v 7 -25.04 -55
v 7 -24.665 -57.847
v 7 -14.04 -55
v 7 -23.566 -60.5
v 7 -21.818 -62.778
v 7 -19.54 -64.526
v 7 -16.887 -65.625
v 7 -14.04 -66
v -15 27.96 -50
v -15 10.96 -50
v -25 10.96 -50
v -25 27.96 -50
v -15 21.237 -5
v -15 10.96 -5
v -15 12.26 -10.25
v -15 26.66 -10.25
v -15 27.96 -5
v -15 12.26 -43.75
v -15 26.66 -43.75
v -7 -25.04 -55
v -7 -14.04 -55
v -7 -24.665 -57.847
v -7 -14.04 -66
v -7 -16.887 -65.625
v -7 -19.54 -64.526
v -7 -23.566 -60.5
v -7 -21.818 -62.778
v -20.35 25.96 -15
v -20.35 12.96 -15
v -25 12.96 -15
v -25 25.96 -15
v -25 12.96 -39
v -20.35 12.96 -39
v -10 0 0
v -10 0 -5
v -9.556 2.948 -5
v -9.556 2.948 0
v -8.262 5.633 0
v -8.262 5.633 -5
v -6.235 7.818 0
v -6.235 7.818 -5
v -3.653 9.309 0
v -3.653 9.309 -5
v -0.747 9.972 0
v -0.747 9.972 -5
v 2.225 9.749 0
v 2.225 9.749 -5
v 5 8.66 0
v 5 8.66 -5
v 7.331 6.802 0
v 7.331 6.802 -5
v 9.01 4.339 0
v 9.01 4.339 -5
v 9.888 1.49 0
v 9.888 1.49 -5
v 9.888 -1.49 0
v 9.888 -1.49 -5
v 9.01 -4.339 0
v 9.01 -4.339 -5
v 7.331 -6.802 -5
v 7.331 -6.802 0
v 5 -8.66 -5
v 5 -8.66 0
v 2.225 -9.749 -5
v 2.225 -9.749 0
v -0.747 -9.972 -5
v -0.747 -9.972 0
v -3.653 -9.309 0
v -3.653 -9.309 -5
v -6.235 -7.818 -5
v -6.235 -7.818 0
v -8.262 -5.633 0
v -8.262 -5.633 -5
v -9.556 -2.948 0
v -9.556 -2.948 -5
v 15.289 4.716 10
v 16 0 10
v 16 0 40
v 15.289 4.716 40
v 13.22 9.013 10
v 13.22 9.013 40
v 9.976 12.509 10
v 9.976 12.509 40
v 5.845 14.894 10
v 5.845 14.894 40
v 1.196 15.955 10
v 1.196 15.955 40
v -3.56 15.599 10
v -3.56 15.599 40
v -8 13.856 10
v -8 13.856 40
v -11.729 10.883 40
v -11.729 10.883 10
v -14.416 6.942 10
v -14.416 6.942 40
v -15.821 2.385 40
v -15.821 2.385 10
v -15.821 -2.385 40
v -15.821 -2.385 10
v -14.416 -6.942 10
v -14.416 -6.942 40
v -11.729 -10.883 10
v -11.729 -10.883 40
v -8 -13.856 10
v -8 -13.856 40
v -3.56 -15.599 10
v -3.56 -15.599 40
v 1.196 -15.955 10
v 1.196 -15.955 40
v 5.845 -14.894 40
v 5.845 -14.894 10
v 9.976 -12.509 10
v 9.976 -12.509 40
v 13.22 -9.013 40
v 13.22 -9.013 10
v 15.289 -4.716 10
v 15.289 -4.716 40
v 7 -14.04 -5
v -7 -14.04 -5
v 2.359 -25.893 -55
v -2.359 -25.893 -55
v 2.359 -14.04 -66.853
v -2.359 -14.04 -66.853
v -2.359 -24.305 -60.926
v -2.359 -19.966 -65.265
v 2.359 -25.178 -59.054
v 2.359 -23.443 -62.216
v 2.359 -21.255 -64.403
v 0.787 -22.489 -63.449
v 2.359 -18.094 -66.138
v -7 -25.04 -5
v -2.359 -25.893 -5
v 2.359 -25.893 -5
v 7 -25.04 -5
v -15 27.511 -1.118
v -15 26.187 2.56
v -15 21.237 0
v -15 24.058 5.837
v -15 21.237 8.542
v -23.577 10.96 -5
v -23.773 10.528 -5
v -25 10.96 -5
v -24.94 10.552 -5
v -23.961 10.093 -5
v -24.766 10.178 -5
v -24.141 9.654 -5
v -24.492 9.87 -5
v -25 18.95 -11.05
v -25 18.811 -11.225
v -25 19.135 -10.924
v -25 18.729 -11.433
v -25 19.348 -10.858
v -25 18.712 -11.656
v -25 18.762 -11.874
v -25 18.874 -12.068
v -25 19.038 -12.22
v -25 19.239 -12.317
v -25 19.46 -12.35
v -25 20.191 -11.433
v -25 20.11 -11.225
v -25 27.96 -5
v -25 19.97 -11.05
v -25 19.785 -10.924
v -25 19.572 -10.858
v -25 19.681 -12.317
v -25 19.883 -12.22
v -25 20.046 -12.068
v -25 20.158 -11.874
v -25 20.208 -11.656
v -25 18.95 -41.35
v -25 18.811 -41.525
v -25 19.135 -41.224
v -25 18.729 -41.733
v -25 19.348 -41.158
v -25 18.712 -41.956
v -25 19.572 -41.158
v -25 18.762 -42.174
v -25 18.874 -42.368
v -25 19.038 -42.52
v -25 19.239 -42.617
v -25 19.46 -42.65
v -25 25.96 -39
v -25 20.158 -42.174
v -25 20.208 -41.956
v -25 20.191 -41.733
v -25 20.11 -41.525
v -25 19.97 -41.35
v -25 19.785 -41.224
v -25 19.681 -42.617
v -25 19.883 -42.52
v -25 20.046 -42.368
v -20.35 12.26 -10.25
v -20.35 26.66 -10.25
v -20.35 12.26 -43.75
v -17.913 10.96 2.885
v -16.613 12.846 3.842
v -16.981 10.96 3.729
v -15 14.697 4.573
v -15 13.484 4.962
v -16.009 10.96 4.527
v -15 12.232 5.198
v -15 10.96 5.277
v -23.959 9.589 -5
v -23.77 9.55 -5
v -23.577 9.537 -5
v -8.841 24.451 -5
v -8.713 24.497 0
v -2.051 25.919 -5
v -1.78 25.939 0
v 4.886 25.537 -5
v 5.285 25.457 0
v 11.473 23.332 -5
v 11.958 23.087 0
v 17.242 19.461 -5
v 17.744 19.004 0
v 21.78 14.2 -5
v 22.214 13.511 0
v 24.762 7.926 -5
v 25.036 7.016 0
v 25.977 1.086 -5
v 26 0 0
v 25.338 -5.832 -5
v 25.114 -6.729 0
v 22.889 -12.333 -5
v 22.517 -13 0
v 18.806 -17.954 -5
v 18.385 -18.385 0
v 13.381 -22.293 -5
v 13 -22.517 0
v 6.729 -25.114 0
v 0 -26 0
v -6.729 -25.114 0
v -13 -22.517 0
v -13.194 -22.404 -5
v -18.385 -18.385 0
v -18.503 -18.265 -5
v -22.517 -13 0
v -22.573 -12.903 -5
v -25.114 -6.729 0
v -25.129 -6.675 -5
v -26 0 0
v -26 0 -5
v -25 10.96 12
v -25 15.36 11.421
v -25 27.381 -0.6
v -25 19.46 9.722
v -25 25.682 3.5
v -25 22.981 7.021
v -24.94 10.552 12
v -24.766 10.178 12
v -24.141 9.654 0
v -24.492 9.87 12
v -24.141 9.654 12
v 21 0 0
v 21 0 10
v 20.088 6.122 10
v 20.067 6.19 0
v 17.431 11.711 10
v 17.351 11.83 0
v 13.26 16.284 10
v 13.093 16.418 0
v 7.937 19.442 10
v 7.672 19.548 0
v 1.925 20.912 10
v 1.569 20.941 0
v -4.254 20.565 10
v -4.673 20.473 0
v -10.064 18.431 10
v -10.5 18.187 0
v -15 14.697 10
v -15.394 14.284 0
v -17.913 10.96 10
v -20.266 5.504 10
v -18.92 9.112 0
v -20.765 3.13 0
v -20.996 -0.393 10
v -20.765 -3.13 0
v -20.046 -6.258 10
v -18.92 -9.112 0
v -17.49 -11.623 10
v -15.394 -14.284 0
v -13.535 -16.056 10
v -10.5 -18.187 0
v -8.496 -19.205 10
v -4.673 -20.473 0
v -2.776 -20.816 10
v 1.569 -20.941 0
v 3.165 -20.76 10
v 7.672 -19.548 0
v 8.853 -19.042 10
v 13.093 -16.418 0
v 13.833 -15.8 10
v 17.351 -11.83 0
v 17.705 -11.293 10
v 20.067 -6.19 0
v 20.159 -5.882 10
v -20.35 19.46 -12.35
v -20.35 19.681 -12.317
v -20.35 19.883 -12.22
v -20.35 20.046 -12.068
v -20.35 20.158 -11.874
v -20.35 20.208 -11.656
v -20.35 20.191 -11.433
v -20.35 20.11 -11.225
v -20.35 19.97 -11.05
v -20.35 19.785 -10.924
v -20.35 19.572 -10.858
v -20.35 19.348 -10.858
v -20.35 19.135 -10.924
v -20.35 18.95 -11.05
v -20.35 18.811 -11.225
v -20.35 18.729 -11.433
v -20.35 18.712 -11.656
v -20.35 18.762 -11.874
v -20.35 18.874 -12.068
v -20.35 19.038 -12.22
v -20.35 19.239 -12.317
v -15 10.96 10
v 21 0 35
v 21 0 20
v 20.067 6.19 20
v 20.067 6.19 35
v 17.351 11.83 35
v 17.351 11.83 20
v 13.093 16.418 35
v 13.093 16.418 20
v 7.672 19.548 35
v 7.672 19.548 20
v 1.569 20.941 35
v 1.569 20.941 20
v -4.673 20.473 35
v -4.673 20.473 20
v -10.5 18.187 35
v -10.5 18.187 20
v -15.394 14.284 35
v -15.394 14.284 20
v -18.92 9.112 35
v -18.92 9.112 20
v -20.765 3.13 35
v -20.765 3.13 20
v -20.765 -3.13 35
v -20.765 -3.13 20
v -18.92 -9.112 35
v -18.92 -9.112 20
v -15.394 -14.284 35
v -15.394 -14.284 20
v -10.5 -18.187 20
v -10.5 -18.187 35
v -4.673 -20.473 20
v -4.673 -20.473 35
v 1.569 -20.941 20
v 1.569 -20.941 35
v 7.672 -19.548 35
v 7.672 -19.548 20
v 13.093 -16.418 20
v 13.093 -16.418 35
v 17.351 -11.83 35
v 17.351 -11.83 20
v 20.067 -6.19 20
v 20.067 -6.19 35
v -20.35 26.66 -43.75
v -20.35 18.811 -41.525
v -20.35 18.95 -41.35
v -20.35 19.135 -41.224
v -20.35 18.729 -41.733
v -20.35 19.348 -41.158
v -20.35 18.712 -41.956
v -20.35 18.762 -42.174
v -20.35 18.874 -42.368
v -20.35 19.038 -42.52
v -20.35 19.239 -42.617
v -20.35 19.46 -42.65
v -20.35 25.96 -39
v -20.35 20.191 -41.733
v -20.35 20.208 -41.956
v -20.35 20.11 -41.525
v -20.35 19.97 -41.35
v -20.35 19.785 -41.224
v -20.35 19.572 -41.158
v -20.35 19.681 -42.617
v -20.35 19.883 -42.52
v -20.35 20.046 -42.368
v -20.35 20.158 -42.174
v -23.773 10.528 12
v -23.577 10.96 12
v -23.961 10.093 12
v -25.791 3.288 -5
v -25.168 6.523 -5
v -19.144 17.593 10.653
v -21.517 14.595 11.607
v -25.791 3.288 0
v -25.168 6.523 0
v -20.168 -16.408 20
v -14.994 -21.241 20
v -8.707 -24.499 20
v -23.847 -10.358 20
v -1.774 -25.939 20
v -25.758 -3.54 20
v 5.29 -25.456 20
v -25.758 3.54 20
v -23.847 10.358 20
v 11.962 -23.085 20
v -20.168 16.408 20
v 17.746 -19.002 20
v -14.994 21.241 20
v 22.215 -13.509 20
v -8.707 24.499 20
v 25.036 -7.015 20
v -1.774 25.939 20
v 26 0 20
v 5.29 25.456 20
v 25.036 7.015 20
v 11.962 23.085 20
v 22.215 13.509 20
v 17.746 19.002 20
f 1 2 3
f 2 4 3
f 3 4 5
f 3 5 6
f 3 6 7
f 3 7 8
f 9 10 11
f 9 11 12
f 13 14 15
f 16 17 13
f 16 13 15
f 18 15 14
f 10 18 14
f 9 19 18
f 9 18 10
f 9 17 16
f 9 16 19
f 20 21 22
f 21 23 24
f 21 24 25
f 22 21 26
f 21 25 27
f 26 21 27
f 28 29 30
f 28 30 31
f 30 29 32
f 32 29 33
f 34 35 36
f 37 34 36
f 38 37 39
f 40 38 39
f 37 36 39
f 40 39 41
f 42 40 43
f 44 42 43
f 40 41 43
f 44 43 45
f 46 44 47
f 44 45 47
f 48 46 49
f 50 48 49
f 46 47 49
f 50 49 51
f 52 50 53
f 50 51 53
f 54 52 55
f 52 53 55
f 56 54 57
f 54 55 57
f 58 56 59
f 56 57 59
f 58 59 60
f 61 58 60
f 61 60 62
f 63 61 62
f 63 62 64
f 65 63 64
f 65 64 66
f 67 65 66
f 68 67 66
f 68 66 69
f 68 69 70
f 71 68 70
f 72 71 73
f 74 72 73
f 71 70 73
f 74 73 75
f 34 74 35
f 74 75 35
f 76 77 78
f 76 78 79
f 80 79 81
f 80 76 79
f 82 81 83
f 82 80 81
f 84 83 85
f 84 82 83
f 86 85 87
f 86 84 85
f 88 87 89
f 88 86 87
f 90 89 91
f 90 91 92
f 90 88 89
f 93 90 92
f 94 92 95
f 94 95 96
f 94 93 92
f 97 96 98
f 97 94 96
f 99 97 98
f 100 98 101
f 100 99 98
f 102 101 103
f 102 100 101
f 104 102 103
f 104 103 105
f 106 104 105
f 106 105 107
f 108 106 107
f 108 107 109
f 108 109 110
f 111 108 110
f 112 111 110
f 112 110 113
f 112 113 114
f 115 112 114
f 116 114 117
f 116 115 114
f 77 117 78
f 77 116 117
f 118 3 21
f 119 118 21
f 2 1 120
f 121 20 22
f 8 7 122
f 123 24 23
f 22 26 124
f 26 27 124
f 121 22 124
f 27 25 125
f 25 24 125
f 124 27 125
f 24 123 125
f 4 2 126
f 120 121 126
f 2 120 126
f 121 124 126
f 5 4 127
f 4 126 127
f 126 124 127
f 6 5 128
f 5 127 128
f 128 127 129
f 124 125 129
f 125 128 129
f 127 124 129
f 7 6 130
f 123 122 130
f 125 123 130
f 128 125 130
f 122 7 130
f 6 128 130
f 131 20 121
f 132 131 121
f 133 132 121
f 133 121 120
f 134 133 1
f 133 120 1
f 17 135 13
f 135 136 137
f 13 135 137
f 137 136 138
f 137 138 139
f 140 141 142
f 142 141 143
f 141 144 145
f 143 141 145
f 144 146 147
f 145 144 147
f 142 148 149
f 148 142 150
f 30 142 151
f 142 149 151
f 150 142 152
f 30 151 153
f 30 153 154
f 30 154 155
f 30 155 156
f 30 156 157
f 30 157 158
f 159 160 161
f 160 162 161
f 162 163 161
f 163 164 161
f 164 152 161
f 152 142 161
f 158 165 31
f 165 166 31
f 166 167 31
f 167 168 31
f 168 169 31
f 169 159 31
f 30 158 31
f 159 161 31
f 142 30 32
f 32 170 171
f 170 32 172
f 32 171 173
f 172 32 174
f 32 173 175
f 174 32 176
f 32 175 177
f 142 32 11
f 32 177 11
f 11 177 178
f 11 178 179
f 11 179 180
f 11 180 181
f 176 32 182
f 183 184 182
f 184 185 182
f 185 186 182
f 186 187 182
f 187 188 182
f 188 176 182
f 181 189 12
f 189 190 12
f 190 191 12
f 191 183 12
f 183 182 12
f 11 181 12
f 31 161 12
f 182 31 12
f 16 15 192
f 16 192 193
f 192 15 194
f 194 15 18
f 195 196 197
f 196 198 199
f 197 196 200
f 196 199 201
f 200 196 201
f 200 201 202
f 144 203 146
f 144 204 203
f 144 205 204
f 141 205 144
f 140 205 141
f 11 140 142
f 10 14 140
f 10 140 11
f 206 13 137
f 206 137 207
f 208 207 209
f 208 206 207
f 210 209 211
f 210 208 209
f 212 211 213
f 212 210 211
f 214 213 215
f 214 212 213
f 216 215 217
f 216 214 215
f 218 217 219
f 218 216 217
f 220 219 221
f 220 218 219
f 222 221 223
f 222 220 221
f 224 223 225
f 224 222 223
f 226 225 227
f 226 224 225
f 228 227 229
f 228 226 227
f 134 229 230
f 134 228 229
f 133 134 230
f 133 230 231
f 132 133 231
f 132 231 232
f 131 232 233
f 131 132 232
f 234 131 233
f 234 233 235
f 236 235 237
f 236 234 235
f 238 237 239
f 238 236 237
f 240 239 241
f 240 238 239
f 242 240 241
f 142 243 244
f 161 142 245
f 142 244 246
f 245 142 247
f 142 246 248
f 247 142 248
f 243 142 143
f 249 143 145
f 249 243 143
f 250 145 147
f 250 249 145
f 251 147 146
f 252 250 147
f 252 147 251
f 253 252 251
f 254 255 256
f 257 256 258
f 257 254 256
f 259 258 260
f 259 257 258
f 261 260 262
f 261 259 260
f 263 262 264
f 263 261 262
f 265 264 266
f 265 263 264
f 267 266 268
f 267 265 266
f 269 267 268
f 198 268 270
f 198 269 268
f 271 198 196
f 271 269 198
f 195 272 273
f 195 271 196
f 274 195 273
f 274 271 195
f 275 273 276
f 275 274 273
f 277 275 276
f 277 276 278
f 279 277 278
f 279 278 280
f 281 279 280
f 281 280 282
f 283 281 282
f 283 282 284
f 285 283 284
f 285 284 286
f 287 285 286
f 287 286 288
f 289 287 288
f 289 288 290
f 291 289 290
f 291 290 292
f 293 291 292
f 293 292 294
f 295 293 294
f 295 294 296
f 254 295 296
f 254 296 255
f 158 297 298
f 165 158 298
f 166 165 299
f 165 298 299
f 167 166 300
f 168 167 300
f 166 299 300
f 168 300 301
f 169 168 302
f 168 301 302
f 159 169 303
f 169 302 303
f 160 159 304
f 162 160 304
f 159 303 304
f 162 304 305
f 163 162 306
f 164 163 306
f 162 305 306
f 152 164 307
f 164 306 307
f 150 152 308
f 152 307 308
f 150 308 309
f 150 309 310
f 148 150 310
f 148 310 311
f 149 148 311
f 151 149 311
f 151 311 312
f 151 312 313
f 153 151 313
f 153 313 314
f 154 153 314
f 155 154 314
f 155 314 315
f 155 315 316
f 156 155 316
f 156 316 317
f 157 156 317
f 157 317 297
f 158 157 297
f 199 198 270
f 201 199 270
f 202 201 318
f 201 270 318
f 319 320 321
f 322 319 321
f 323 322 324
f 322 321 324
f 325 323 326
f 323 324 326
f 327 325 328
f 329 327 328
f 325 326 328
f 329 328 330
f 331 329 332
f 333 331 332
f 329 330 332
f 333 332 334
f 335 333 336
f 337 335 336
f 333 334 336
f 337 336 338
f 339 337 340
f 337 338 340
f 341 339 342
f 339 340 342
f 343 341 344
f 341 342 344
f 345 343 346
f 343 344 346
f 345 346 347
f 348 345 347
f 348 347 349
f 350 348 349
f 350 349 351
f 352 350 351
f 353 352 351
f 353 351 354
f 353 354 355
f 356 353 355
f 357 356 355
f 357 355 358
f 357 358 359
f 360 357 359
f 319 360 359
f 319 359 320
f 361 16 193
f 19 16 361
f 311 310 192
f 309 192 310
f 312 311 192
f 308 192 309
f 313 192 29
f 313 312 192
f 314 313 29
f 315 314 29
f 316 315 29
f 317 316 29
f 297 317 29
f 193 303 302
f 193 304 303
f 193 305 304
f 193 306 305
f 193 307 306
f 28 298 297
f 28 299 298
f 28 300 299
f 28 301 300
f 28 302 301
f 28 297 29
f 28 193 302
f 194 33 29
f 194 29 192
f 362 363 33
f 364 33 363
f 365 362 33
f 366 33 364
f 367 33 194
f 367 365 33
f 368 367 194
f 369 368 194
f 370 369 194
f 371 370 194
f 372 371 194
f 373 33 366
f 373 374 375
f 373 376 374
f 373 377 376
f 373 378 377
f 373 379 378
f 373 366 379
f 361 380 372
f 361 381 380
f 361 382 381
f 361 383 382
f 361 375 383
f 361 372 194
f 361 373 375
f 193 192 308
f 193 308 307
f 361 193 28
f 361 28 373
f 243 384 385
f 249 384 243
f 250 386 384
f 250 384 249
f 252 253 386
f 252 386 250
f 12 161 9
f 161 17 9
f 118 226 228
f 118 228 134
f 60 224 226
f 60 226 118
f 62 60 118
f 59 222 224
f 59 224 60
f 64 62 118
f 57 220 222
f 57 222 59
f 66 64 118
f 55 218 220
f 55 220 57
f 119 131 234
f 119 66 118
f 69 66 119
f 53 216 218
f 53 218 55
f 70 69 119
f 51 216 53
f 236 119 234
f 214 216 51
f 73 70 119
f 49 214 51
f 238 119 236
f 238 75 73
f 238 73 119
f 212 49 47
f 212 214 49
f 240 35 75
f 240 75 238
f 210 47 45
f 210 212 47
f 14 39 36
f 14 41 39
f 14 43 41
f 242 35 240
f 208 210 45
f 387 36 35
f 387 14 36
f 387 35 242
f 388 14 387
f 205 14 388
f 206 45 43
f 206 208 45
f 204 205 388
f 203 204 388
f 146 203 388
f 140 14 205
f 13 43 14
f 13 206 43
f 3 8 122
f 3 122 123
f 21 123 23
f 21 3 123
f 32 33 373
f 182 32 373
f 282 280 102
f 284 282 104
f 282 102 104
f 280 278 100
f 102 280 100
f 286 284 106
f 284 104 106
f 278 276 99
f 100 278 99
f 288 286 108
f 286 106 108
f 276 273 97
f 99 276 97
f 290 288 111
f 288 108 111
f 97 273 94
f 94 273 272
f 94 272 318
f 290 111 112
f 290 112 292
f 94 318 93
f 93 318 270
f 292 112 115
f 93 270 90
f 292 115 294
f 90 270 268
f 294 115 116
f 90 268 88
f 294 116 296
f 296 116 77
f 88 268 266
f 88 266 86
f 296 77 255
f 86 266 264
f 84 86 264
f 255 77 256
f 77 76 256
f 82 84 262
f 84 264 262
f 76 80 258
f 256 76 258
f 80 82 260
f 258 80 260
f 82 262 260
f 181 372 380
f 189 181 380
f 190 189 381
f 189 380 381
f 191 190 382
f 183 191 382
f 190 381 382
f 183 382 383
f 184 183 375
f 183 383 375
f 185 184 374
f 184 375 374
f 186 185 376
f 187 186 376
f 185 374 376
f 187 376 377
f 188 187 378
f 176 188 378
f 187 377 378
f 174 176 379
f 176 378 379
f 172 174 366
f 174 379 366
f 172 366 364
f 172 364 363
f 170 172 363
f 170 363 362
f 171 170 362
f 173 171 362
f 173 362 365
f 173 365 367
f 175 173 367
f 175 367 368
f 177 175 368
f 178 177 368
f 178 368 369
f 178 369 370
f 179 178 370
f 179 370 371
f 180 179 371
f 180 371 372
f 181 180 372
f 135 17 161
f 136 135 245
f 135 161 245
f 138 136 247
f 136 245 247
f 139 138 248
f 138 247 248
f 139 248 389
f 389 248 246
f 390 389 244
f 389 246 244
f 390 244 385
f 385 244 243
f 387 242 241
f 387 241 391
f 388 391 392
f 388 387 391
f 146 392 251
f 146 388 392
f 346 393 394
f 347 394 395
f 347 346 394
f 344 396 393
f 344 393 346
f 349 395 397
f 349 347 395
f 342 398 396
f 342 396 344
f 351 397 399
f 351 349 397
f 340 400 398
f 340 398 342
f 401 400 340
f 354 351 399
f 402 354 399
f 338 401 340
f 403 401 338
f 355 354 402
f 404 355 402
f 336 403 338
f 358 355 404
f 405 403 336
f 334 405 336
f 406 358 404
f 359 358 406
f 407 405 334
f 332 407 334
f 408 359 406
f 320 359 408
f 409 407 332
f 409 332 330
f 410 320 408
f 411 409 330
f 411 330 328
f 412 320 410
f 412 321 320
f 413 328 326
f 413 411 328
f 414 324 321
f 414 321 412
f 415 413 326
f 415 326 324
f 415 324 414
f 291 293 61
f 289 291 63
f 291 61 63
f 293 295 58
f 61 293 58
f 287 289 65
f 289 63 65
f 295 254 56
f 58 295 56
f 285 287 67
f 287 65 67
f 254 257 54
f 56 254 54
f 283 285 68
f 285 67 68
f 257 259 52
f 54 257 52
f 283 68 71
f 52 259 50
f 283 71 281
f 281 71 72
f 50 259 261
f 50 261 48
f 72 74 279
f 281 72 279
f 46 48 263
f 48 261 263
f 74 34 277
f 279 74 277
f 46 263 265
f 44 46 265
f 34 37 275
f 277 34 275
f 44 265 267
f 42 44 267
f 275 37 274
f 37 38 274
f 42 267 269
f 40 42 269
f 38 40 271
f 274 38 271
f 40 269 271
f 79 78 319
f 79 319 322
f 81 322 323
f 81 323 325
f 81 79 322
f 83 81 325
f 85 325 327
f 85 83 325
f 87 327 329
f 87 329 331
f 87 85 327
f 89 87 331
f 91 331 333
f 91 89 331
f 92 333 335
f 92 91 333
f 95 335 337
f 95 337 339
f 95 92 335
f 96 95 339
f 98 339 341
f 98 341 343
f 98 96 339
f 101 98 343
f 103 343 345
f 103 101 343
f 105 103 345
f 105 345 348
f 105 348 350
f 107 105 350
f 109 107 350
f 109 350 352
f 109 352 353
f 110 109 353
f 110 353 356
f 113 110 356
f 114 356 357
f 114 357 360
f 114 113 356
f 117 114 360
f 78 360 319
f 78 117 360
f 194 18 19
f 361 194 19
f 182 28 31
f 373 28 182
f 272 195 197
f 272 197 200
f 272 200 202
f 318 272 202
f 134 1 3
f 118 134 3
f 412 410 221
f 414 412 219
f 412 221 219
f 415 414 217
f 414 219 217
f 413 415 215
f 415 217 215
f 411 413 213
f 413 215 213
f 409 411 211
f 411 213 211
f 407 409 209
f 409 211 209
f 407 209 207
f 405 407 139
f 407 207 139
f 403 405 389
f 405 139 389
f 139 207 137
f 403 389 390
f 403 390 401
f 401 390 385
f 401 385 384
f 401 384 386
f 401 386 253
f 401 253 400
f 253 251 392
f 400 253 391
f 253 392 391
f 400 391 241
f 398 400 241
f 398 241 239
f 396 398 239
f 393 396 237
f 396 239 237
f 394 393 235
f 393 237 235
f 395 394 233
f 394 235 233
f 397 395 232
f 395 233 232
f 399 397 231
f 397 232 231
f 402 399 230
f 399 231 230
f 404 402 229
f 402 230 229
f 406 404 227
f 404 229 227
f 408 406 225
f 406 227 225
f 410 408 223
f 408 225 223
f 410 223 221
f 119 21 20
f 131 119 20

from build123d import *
from build123d.topology import SkipClean

# Parameters (mm, degrees)
SKETCH15_R          = 26
SKETCH15_R_2        = 21
BOSS_EXTRUDE2_DEPTH = 20
BOSS_EXTRUDE5_START = -10
SKETCH18_R          = 21
SKETCH18_R_2        = 16
BOSS_EXTRUDE5_DEPTH = 30
CHAMFER1_SIZE       = 5
BOSS_EXTRUDE6_START = 5
SKETCH21_R          = 26
SKETCH21_R_2        = 10
BOSS_EXTRUDE6_DEPTH = 5
BOSS_EXTRUDE8_START = 50
BOSS_EXTRUDE8_DEPTH = 50
REVOLVE2_ANGLE      = 90
BOSS_EXTRUDE9_START = -20
SKETCH26_W          = 45
SKETCH26_H          = 17
BOSS_EXTRUDE9_DEPTH = 5
CUT_EXTRUDE1_REACH  = 85.345
SKETCH27_W          = 24
SKETCH27_H          = 13
REVOLVE3_ANGLE      = 90
SKETCH29_W          = 1.422941242
SKETCH29_H          = 17
REVOLVE4_ANGLE      = 90
SKETCH31_R          = 0.75
CUT_EXTRUDE2_DEPTH  = 84.345121507
SKETCH32_W          = 33.5
SKETCH32_H          = 14.4
CUT_EXTRUDE3_DEPTH  = 5.35


with BuildPart() as part:
    # Sketch15 → Boss-Extrude2 (new body)
    with BuildSketch(Plane.XY):
        Circle(SKETCH15_R)
        Circle(SKETCH15_R_2, mode=Mode.SUBTRACT)
    extrude(amount=BOSS_EXTRUDE2_DEPTH)

    # Sketch18 → Boss-Extrude5 (add)
    with BuildSketch(Plane.XY.offset(20).offset(BOSS_EXTRUDE5_START)):
        Circle(SKETCH18_R)
        Circle(SKETCH18_R_2, mode=Mode.SUBTRACT)
    extrude(amount=BOSS_EXTRUDE5_DEPTH)

    # Chamfer1
    chamfer1_edges = [part.edges().sort_by_distance(p)[0] for p in [
        (-21, 0, 40),
    ]]
    chamfer(chamfer1_edges, length=CHAMFER1_SIZE - 0.0001)  # a hair under: the kernel refuses the full size

    # Sketch21 → Boss-Extrude6 (add)
    with BuildSketch(Plane(origin=(0, 0, 0), x_dir=(-1, 0, 0), z_dir=(0, 0, -1)).offset(BOSS_EXTRUDE6_START)):
        Circle(SKETCH21_R)
        Circle(SKETCH21_R_2, mode=Mode.SUBTRACT)
    extrude(amount=-BOSS_EXTRUDE6_DEPTH)

    # Sketch23 → Boss-Extrude8 (add)
    with BuildSketch(Plane(origin=(0, 0, -5), x_dir=(-1, 0, 0), z_dir=(0, 0, -1)).offset(BOSS_EXTRUDE8_START)):
        with BuildLine():
            Line((-7, -25.039968051), (-7, -14.039968051))
            Line((-7, -14.039968051), (7, -14.039968051))
            Line((7, -14.039968051), (7, -25.039968051))
            ThreePointArc((7, -25.039968051), (0, -26), (-7, -25.039968051))
        make_face()
    extrude(amount=-BOSS_EXTRUDE8_DEPTH)

    # Sketch25 → Revolve2 (revolve)
    with SkipClean():  # the faces are left unmerged after this step: merging them gives an invalid solid
        with BuildSketch(Plane(origin=(0, 0, -55), x_dir=(-1, 0, 0), z_dir=(0, 0, -1))):
            with BuildLine():
                Line((-7, -14.039968051), (-7, -25.039968051))
                ThreePointArc((-7, -25.039968051), (0, -26), (7, -25.039968051))
                Line((7, -25.039968051), (7, -14.039968051))
                Line((7, -14.039968051), (-7, -14.039968051))
            make_face()
        revolve(axis=Axis((-7, -14.039968051, -55), (1, 0, 0)), revolution_arc=REVOLVE2_ANGLE)

    # Sketch26 → Boss-Extrude9 (add, symmetric)
    with BuildSketch(Plane(origin=(0, 0, 0), x_dir=(0, 0, -1), z_dir=(1, 0, 0)).offset(BOSS_EXTRUDE9_START)):
        with Locations((27.5, 19.460031949)):
            Rectangle(SKETCH26_W, SKETCH26_H)
    extrude(amount=BOSS_EXTRUDE9_DEPTH, both=True)

    # Sketch27 → Cut-Extrude1 (cut, up to next)
    with BuildSketch(Plane(origin=(-15, 0, 0), x_dir=(0, 0, -1), z_dir=(1, 0, 0)), mode=Mode.PRIVATE) as cut_extrude1_sk1:
        with Locations((27, 19.460031949)):
            Rectangle(SKETCH27_W, SKETCH27_H)
    cut_extrude1_tool1 = extrude(cut_extrude1_sk1.sketch, amount=-CUT_EXTRUDE1_REACH, mode=Mode.PRIVATE) & part.part
    add(cut_extrude1_tool1.solids().sort_by_distance((-15, 19.460032, -27))[0], mode=Mode.SUBTRACT)

    # Sketch28 → Revolve3 (revolve)
    with SkipClean():  # the faces are left unmerged after this step: merging them gives an invalid solid
        with BuildSketch(Plane.XY.offset(-5)):
            with BuildLine():
                Line((-25, 10.960031949), (-23.577058758, 10.960031949))
                ThreePointArc((-23.577058758, 10.960031949), (-19.961216232, 16.659827326), (-15, 21.236760582))
                Line((-15, 21.236760582), (-15, 27.960031949))
                Line((-15, 27.960031949), (-25, 27.960031949))
                Line((-25, 27.960031949), (-25, 10.960031949))
            make_face()
        revolve(axis=Axis((-25, 10.960031949, -5), (1, 0, 0)), revolution_arc=REVOLVE3_ANGLE)

    # Sketch29 → Revolve4 (revolve)
    with SkipClean():  # the faces are left unmerged after this step: merging them gives an invalid solid
        with BuildSketch(Plane.XZ.offset(-10.960031949)):
            with Locations((-24.288529379, 3.5)):
                Rectangle(SKETCH29_W, SKETCH29_H)
        revolve(axis=Axis((-23.577058758, 10.960031949, 12), (0, 0, 1)), revolution_arc=REVOLVE4_ANGLE)

    # Sketch31 → Cut-Extrude2 (cut, through all)
    with SkipClean():  # the faces are left unmerged after this step: merging them gives an invalid solid
        with BuildSketch(Plane(origin=(-15, 0, 0), x_dir=(0, 0, -1), z_dir=(1, 0, 0))):
            with Locations((41.9, 19.460031949)):
                Circle(SKETCH31_R)
            with Locations((11.6, 19.460031949)):
                Circle(SKETCH31_R)
        extrude(amount=-CUT_EXTRUDE2_DEPTH, mode=Mode.SUBTRACT)

    # Sketch32 → Cut-Extrude3 (cut)
    with SkipClean():  # the faces are left unmerged after this step: merging them gives an invalid solid
        with BuildSketch(Plane(origin=(-15, 0, 0), x_dir=(0, 0, -1), z_dir=(1, 0, 0))):
            with Locations((27, 19.460031949)):
                Rectangle(SKETCH32_W, SKETCH32_H)
        extrude(amount=-CUT_EXTRUDE3_DEPTH, mode=Mode.SUBTRACT)


solid = part.part
